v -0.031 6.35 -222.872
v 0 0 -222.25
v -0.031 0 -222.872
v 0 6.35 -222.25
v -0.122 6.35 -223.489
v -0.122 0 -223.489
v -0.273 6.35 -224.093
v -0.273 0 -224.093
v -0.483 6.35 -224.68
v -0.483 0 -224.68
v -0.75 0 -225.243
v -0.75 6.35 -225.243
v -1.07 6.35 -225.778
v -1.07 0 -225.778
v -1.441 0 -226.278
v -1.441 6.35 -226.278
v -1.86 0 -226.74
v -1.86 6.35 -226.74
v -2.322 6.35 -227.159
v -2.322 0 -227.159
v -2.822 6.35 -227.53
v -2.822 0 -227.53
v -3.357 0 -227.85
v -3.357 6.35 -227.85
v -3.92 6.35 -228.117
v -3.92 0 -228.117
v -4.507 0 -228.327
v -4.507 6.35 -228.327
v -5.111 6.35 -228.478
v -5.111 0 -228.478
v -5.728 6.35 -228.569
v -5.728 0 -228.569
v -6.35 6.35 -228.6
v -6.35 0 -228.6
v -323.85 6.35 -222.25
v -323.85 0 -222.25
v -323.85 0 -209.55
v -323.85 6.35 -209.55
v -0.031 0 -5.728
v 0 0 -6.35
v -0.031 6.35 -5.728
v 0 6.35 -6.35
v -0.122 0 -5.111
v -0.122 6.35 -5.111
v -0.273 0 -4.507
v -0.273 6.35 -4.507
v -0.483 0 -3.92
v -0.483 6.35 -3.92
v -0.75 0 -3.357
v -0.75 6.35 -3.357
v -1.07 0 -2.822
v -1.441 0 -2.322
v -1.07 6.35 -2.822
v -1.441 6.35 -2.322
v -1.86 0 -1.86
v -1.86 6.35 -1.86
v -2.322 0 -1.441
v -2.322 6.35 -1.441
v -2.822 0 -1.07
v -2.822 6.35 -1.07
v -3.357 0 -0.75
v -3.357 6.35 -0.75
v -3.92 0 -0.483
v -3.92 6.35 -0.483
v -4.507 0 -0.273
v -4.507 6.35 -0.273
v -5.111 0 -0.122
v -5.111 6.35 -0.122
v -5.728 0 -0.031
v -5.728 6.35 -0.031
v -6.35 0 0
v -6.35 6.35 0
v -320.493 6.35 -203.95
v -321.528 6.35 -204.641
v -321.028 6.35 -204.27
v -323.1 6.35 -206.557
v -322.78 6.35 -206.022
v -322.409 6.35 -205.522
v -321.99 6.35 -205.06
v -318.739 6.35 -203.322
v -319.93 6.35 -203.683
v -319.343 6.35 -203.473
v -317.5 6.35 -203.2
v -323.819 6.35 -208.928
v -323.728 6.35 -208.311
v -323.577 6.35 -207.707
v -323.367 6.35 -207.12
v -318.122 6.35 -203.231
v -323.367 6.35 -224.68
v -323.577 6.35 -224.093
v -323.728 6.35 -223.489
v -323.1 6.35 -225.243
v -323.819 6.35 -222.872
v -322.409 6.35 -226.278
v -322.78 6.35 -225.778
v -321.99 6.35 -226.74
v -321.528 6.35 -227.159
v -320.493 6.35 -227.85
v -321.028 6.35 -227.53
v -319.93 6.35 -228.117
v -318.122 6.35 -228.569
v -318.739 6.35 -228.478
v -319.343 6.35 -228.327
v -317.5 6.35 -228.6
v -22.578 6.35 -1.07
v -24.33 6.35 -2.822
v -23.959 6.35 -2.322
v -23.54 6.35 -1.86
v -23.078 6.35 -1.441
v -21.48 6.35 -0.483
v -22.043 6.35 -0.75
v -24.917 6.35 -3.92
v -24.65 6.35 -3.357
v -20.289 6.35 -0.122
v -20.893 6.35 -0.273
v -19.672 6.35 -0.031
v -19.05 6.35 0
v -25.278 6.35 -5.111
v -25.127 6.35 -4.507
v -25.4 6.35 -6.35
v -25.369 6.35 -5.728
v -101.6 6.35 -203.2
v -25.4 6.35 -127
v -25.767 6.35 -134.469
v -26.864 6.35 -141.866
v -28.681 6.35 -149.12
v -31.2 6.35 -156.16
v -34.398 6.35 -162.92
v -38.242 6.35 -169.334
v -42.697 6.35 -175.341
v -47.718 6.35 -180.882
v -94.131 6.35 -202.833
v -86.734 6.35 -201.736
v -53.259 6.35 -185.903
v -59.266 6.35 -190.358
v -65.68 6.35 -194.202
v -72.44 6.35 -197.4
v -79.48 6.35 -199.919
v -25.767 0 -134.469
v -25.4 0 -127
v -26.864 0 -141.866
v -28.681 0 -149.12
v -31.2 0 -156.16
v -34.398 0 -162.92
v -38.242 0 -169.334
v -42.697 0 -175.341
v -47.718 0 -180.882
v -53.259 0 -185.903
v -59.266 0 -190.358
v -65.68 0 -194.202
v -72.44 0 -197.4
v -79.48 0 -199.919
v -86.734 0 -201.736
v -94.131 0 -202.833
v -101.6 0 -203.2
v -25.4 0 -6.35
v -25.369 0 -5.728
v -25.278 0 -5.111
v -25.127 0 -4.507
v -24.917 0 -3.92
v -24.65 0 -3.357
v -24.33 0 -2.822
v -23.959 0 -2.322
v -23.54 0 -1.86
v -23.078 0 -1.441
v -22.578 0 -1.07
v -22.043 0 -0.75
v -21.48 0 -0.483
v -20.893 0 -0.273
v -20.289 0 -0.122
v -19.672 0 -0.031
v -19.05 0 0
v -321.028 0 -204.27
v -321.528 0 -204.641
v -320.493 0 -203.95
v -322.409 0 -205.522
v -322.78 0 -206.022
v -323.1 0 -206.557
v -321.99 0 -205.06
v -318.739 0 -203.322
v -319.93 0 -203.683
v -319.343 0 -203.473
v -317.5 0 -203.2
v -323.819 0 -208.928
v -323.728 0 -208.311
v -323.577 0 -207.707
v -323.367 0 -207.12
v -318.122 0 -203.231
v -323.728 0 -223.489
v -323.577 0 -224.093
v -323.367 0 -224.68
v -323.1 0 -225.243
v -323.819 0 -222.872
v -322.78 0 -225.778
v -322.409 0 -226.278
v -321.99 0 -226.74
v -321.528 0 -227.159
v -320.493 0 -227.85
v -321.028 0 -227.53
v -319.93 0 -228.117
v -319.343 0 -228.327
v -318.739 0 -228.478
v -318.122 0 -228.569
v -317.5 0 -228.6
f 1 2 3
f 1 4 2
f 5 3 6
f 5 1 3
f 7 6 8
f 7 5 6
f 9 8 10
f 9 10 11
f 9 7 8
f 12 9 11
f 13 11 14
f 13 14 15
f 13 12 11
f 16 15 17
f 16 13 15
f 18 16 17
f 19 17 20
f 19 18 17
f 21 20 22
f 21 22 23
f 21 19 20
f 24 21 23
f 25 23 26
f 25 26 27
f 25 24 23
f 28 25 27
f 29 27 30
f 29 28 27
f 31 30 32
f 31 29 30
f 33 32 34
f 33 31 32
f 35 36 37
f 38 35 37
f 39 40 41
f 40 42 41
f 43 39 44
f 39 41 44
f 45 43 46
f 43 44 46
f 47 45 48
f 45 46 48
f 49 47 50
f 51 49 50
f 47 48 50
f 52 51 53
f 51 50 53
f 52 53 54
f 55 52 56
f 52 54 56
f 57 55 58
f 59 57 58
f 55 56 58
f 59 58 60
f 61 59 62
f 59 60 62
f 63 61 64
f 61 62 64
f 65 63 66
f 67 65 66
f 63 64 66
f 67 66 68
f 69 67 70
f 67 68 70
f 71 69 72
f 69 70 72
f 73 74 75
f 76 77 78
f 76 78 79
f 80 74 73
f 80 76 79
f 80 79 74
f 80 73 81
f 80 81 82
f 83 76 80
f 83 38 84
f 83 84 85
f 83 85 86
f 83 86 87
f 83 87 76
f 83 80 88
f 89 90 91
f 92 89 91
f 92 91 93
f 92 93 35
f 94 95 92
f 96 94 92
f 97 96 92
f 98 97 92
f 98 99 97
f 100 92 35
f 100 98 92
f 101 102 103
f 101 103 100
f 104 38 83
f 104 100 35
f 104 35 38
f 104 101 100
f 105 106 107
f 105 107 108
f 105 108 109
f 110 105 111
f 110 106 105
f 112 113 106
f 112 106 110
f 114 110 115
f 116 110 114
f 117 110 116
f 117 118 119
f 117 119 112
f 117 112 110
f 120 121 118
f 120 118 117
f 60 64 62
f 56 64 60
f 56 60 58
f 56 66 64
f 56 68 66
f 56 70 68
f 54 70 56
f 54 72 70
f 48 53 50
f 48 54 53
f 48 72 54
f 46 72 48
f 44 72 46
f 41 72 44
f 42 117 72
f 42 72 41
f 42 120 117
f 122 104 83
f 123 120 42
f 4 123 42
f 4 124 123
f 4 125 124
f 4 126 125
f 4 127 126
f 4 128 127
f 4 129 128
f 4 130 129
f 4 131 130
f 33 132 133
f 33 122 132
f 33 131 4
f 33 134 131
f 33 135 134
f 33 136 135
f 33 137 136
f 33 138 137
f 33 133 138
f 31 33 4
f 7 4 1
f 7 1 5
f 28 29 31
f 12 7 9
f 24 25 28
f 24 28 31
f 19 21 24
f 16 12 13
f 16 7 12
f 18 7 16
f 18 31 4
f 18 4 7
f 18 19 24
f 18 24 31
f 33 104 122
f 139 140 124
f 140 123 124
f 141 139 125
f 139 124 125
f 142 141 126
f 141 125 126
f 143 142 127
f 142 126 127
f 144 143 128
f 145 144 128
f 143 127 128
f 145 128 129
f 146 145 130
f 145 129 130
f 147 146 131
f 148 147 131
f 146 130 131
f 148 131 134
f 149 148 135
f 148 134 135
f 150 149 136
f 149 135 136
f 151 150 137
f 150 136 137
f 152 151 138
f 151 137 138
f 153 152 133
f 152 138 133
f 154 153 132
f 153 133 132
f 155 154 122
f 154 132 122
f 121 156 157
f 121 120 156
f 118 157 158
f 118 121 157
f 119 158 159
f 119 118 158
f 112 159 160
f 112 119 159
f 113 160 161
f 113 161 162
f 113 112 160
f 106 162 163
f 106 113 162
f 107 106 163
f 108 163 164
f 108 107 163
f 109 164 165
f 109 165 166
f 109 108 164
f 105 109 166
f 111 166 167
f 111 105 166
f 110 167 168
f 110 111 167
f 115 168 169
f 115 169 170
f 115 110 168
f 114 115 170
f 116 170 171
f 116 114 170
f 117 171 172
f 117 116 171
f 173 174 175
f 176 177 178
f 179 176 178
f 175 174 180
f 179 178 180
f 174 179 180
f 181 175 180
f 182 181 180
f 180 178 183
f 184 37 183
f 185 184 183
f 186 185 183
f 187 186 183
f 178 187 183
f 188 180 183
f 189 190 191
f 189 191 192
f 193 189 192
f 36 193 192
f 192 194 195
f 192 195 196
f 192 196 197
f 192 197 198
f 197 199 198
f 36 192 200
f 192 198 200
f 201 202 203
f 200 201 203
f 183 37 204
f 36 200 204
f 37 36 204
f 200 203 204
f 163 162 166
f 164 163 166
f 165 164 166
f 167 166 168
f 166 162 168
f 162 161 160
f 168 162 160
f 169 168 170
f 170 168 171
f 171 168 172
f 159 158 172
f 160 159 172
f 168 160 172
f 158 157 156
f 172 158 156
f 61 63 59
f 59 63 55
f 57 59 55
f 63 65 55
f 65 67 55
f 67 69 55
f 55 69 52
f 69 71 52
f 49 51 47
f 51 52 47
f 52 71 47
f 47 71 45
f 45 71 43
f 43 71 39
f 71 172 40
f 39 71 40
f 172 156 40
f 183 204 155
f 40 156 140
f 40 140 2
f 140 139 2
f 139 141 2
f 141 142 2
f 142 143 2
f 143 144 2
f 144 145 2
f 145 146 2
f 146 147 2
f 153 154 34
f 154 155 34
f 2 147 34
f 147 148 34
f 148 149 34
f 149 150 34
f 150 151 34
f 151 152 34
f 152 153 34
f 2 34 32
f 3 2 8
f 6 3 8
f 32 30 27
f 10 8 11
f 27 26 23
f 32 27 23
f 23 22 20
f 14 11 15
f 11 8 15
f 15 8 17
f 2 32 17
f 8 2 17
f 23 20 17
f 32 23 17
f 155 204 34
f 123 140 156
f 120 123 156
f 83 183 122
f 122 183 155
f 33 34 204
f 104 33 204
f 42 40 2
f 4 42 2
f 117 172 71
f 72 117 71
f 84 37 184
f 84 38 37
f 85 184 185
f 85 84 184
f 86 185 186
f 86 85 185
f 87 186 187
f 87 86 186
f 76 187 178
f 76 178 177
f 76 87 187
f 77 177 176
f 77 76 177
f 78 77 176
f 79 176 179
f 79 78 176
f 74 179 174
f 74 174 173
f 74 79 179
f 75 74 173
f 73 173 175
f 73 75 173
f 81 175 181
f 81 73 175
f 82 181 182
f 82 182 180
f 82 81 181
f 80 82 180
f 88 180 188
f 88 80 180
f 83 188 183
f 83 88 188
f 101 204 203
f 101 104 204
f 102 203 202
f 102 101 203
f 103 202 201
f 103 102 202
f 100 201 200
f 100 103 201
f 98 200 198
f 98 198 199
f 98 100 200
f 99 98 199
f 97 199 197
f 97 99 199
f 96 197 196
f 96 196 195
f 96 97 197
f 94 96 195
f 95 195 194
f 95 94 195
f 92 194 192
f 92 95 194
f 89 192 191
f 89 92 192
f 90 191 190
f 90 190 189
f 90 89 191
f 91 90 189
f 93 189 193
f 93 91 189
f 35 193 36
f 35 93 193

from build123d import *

# Parameters (mm, degrees)
BOSS_EXTRUDE1_DEPTH = 6.35
FILLET1_R           = 6.35
FILLET2_R           = 76.2


with BuildPart() as part:
    # Sketch1 → Boss-Extrude1 (new body)
    with BuildSketch(Plane(origin=(0, 0, 0), x_dir=(1, 0, 0), z_dir=(0, 1, 0))):
        Polygon((0, 0), (0, 228.6), (-323.85, 228.6), (-323.85, 203.2), (-25.4, 203.2), (-25.4, 0), align=None)
    extrude(amount=BOSS_EXTRUDE1_DEPTH)

    # Fillet1
    fillet1_edges = [part.edges().sort_by_distance(p)[0] for p in [
        (-25.4, 3.175, 0),
        (-323.85, 3.175, -203.2),
        (-323.85, 3.175, -228.6),
        (0, 3.175, -228.6),
        (0, 3.175, 0),
    ]]
    fillet(fillet1_edges, radius=FILLET1_R)

    # Fillet2
    fillet2_edges = [part.edges().sort_by_distance(p)[0] for p in [
        (-25.4, 3.175, -203.2),
    ]]
    fillet(fillet2_edges, radius=FILLET2_R)


solid = part.part
